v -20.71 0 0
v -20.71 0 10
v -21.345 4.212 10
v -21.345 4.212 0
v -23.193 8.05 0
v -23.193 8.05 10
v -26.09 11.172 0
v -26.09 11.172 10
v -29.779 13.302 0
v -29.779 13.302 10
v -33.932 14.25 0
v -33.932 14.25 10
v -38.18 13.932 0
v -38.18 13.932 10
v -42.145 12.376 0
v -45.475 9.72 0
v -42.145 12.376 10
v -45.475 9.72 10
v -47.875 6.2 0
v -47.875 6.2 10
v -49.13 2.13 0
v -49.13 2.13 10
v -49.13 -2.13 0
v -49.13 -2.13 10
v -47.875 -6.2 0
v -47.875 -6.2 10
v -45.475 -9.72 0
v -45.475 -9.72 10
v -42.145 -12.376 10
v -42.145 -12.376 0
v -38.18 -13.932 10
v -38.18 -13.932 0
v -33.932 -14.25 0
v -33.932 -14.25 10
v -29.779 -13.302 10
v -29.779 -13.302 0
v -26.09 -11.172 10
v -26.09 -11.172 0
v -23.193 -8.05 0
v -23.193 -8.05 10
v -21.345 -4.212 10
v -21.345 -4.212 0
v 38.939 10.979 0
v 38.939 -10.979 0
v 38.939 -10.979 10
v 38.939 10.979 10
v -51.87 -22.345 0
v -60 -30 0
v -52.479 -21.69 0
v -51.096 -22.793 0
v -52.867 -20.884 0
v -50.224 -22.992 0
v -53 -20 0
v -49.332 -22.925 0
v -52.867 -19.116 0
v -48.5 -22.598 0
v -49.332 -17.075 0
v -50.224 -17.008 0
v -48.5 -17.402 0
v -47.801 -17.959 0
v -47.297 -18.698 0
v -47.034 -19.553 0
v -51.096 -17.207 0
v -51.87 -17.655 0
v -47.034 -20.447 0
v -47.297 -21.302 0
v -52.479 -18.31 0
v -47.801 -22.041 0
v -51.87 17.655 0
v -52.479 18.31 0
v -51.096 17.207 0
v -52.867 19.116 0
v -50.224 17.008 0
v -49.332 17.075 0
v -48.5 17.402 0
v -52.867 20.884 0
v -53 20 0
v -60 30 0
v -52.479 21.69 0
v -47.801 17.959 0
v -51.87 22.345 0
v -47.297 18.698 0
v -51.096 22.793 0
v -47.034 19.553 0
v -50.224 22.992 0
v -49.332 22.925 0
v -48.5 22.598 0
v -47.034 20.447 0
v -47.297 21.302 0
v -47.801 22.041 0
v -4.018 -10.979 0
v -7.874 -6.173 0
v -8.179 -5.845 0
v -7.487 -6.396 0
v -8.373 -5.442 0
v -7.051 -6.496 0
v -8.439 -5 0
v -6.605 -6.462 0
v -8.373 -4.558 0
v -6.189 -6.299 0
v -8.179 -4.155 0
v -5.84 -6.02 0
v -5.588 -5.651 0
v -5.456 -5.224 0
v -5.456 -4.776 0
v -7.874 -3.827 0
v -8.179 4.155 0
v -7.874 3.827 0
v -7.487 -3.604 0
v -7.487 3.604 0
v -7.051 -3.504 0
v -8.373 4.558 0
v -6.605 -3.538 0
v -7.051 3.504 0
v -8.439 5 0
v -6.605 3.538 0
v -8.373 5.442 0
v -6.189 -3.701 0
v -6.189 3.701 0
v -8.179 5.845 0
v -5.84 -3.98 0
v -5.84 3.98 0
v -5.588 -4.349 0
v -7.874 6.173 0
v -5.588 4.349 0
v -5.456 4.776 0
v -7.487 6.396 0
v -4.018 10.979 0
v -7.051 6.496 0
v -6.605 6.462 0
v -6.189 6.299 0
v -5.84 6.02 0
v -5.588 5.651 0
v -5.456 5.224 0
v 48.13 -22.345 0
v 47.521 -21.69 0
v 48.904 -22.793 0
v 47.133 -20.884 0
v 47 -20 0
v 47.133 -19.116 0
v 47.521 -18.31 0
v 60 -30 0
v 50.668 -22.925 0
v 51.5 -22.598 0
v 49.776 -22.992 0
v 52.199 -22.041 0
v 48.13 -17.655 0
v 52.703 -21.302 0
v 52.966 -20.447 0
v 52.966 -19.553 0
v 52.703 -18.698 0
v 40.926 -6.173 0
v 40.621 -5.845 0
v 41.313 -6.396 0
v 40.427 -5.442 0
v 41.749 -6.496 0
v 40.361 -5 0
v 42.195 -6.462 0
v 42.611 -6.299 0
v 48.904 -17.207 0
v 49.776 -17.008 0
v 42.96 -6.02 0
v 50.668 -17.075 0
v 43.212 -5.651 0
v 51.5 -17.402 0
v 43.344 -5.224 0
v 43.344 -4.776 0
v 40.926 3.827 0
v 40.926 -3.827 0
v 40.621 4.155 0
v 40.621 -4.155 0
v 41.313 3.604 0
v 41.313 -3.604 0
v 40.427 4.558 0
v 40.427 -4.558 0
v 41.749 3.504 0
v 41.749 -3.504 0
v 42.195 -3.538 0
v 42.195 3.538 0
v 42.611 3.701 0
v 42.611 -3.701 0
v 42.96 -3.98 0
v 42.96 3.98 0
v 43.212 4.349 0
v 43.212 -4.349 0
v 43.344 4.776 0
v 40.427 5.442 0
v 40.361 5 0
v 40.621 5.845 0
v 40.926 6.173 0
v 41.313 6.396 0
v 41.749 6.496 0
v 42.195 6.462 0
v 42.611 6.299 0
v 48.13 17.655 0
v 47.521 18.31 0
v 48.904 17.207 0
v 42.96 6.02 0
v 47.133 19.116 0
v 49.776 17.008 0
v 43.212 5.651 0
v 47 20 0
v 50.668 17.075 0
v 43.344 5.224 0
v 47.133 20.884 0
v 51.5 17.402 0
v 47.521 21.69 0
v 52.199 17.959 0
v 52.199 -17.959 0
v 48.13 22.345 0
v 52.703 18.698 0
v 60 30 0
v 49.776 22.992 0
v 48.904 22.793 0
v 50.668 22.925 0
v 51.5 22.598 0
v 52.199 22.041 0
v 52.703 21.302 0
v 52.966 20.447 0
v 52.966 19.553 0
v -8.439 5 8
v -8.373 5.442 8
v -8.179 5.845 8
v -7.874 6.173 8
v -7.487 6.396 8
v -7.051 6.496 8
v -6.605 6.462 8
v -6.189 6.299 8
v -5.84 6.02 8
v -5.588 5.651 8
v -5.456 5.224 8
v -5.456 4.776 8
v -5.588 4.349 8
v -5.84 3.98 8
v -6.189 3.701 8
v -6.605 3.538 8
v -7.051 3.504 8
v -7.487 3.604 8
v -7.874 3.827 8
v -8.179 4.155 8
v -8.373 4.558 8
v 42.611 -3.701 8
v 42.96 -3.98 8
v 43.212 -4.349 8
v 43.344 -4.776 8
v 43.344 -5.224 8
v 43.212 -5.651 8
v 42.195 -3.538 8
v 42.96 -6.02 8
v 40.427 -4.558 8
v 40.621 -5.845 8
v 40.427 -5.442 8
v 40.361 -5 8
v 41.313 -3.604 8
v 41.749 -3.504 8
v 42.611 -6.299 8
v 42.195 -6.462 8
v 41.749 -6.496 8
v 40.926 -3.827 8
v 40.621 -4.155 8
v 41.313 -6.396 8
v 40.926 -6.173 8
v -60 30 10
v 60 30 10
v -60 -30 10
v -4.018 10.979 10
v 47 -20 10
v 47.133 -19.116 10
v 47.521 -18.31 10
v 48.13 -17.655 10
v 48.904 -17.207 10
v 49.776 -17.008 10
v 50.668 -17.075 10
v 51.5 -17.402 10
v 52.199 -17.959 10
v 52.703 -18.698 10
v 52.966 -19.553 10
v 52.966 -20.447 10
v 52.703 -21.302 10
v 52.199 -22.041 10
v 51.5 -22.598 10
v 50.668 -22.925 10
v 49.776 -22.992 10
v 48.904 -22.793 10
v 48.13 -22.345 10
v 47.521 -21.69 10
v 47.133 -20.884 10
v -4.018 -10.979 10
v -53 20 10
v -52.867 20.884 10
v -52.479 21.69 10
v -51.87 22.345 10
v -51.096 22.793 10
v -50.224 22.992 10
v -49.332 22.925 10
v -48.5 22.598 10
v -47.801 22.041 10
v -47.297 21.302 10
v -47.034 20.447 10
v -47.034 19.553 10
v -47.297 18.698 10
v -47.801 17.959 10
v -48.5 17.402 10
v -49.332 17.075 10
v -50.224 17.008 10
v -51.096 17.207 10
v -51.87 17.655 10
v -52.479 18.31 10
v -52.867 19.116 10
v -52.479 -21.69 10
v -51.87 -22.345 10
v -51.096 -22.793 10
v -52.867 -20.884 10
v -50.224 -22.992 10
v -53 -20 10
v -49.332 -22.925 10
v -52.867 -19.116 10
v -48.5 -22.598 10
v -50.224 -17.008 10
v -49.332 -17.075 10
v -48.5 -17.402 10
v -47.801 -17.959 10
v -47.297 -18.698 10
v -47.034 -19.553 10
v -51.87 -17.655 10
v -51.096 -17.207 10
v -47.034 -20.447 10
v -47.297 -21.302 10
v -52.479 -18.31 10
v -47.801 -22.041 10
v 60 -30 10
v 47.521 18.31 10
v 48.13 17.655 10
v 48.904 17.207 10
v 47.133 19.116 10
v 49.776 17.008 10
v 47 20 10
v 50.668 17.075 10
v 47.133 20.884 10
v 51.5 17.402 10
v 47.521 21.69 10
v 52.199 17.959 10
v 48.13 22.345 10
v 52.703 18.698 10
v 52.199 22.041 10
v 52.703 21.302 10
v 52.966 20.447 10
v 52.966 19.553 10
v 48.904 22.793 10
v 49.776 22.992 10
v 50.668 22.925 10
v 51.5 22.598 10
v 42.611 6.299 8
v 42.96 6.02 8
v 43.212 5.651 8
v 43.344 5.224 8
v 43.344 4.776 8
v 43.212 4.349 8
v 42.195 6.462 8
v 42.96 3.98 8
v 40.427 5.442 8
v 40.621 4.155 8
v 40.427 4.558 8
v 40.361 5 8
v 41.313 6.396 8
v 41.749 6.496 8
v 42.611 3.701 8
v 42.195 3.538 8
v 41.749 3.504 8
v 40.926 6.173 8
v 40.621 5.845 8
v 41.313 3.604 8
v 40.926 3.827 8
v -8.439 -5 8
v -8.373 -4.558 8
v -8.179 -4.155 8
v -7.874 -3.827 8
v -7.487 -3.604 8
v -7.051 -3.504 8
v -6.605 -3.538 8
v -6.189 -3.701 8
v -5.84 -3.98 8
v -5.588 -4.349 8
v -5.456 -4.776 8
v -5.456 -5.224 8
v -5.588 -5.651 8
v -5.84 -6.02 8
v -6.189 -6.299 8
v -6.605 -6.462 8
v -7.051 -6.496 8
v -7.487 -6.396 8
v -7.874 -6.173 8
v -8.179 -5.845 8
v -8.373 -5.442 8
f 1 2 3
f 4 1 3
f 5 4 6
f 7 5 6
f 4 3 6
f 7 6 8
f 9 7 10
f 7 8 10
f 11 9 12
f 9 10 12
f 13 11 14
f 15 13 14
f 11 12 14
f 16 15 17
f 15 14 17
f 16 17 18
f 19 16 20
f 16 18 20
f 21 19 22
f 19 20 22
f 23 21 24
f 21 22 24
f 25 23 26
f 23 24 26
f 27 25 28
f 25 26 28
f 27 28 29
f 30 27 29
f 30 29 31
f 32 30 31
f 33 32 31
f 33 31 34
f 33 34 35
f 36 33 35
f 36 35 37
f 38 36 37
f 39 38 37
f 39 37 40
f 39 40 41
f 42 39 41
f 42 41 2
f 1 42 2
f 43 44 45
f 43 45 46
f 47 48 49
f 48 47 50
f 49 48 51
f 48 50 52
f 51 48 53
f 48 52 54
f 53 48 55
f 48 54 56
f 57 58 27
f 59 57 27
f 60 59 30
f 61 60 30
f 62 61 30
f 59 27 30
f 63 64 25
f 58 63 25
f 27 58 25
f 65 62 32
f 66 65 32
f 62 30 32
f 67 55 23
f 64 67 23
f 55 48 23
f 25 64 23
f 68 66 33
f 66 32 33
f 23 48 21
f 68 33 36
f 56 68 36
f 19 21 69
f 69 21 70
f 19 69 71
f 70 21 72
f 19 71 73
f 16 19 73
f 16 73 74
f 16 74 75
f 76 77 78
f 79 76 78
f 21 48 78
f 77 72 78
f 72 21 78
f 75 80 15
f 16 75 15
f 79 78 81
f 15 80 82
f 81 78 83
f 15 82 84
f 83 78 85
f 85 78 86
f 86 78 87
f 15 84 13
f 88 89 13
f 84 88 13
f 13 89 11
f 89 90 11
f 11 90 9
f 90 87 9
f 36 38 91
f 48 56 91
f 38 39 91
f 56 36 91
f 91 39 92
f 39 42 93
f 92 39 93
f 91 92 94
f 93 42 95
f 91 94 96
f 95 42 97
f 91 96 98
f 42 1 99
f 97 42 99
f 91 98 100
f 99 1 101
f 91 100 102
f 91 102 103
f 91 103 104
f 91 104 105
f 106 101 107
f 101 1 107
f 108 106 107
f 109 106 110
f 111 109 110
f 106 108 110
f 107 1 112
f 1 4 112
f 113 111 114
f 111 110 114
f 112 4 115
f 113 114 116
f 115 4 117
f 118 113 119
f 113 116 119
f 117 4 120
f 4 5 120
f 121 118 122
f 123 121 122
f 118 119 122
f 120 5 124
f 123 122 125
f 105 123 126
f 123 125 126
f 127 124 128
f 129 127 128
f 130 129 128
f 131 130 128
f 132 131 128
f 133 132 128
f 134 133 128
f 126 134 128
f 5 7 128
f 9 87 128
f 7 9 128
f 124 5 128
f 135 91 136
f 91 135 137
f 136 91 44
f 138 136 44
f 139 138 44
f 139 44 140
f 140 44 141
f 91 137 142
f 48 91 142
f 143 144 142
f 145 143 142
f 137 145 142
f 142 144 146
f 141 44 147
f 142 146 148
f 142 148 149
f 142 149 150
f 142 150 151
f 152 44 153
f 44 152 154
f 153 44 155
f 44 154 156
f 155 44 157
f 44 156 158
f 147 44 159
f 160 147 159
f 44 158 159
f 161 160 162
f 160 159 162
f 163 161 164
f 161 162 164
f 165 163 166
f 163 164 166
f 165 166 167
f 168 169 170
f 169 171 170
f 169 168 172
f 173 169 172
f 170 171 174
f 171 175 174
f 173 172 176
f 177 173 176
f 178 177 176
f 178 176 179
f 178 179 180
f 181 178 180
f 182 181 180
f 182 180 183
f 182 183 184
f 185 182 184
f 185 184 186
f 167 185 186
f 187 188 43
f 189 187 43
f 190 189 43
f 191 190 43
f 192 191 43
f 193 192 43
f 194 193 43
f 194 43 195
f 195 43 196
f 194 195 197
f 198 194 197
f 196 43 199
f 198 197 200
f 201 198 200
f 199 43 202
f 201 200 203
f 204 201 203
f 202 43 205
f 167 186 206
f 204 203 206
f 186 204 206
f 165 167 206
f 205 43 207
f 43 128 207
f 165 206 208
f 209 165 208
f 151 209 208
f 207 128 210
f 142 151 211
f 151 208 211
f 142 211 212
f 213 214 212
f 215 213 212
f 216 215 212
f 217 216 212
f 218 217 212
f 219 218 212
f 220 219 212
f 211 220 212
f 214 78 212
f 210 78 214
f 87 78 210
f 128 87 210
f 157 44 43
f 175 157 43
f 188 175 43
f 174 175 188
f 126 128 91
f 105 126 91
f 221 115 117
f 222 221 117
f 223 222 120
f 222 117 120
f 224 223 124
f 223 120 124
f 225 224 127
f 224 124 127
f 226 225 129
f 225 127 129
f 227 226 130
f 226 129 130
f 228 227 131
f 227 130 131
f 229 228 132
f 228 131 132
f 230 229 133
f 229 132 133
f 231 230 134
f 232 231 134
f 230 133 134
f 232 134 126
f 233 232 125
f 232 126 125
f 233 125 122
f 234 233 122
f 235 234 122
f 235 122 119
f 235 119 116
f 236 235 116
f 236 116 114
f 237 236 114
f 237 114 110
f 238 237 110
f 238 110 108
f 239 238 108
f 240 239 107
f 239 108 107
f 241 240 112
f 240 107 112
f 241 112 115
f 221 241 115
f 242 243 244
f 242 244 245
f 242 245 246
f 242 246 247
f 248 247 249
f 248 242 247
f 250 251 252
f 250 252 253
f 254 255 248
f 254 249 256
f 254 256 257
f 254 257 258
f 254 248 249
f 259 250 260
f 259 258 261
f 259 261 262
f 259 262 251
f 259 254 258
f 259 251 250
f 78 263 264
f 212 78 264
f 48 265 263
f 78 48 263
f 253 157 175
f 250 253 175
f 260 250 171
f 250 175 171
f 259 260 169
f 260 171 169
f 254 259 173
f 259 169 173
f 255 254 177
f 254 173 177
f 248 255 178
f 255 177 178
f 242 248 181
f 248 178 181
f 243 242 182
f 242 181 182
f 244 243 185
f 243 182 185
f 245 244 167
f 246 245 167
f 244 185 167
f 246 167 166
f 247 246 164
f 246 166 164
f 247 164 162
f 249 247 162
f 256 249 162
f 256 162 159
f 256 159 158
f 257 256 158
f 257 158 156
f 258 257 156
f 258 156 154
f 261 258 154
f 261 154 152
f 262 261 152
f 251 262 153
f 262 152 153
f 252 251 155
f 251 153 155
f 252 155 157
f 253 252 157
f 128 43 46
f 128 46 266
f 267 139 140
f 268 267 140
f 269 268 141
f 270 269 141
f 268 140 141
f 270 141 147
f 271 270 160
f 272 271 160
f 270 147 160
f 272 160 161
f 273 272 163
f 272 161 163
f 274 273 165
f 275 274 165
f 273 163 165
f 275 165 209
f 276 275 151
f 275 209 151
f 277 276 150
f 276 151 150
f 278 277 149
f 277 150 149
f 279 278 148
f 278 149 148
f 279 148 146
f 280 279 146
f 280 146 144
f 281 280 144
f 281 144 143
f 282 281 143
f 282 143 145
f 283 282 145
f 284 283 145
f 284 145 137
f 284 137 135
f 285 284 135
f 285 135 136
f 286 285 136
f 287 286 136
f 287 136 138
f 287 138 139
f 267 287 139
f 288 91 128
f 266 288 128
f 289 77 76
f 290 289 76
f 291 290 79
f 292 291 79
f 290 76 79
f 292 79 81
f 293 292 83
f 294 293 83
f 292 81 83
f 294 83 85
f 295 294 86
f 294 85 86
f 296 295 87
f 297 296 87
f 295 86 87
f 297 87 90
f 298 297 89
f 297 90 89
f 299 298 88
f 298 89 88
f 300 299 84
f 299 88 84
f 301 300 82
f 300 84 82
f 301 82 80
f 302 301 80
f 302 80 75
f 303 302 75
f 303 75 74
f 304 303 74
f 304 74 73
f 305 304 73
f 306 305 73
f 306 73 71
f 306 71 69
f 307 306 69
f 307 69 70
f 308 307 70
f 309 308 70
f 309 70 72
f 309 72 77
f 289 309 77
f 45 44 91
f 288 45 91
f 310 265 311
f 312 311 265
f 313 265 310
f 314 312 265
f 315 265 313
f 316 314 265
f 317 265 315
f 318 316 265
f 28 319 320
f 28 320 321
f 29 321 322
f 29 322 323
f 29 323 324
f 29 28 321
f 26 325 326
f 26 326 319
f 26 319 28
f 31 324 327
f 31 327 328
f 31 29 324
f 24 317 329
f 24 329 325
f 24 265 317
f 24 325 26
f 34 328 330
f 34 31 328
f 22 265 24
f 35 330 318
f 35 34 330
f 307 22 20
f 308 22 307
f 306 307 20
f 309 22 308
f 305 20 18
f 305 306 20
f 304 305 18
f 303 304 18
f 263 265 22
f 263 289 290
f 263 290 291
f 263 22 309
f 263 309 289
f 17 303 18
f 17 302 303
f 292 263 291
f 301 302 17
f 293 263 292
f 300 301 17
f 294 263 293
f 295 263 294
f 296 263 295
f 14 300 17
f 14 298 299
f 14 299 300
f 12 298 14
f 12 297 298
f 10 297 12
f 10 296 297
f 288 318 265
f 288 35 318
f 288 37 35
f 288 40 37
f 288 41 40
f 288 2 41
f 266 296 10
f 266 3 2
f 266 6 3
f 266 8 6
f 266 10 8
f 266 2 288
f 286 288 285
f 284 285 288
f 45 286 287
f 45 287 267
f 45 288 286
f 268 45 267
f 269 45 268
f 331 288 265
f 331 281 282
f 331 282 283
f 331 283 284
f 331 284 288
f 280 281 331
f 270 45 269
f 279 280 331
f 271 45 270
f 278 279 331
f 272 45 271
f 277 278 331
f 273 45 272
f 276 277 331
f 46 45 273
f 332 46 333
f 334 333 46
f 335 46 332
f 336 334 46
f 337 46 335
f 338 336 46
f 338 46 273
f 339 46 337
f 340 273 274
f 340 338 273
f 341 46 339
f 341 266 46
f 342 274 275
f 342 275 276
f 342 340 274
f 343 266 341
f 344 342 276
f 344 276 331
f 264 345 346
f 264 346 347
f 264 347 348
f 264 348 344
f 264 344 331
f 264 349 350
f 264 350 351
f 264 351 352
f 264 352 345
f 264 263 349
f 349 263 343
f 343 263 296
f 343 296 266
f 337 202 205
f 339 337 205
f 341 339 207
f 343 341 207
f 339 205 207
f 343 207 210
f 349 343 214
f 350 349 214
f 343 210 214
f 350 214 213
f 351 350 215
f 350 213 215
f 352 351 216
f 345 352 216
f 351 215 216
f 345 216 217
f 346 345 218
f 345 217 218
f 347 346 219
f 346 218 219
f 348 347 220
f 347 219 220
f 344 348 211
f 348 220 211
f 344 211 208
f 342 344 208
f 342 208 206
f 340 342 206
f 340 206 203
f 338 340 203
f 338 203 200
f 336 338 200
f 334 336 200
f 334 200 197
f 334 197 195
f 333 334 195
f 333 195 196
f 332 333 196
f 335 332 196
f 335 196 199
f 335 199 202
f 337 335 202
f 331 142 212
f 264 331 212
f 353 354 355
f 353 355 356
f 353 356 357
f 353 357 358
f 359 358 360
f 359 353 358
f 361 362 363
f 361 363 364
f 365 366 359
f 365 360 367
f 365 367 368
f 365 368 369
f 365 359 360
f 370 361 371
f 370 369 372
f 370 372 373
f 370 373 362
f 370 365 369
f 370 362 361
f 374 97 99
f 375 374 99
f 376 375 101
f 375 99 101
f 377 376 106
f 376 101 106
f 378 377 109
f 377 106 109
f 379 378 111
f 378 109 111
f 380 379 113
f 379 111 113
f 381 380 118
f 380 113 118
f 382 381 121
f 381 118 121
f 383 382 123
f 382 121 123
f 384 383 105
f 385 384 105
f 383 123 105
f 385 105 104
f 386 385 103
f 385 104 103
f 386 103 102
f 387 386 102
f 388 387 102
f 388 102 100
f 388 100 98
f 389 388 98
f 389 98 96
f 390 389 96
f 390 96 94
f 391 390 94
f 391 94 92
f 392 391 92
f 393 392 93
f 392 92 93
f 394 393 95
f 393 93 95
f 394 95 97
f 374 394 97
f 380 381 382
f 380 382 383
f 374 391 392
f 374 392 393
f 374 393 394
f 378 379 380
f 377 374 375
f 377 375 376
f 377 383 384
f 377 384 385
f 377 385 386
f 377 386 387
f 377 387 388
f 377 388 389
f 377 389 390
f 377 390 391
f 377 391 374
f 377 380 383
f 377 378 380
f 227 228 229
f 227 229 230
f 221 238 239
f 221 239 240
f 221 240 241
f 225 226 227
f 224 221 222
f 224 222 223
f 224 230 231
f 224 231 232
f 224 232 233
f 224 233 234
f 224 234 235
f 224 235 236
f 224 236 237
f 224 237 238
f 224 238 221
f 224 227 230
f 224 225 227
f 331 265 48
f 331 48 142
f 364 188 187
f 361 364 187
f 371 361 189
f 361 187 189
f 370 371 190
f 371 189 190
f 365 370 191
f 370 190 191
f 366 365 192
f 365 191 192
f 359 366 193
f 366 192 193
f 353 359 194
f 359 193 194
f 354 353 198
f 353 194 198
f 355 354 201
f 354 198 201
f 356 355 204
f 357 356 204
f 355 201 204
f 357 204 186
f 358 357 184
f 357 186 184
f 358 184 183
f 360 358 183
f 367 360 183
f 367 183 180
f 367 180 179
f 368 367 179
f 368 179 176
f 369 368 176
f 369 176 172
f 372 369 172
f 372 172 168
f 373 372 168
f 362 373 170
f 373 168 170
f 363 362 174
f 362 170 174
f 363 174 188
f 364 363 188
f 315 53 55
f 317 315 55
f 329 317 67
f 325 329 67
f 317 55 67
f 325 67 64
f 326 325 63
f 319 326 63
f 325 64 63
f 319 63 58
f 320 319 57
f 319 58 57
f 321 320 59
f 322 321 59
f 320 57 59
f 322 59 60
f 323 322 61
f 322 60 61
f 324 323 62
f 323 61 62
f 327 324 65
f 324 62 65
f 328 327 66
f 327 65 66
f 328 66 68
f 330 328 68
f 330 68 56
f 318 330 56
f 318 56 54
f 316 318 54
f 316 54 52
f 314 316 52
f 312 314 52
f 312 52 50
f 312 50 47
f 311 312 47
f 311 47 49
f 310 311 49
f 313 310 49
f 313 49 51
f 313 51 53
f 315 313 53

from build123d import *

# Parameters (mm, degrees)
CROQUIS1_W              = 120
CROQUIS1_H              = 60
SALIENTE_EXTRUIR1_DEPTH = 10
CROQUIS2_R              = 14.29
CROQUIS2_R_2            = 4.5
CORTAR_EXTRUIR1_DEPTH   = 68.823299831
CROQUIS3_W              = 42.957247878
CROQUIS3_H              = 21.957247878
CORTAR_EXTRUIR2_DEPTH   = 68.823299831
CROQUIS4_R              = 1.5
CORTAR_EXTRUIR3_DEPTH   = 8
CROQUIS5_W              = 40
CROQUIS5_H              = 60
SALIENTE_EXTRUIR2_DEPTH = 10
CROQUIS6_R              = 14.29
CORTAR_EXTRUIR4_DEPTH   = 105.880884817
CROQUIS7_W              = 40
CROQUIS7_H              = 60
CORTAR_EXTRUIR5_DEPTH   = 105.880884817
CROQUIS8_R              = 3
CORTAR_EXTRUIR6_DEPTH   = 68.823299831


with BuildPart() as part:
    # Croquis1 → Saliente-Extruir1 (new body)
    with BuildSketch(Plane.XY):
        Rectangle(CROQUIS1_W, CROQUIS1_H)
    extrude(amount=SALIENTE_EXTRUIR1_DEPTH)

    # Croquis2 → Cortar-Extruir1 (cut, through all)
    with BuildSketch(Plane.XY.offset(10)):
        with Locations((-35, 0)):
            Circle(CROQUIS2_R)
        with Locations((6.9608, 0)):
            Circle(CROQUIS2_R_2)
    extrude(amount=-CORTAR_EXTRUIR1_DEPTH, mode=Mode.SUBTRACT)

    # Croquis3 → Cortar-Extruir2 (cut, through all)
    with BuildSketch(Plane(origin=(0, 0, 0), x_dir=(-1, 0, 0), z_dir=(0, 0, -1))):
        with Locations((-17.4608, 0)):
            Rectangle(CROQUIS3_W, CROQUIS3_H)
    extrude(amount=-CORTAR_EXTRUIR2_DEPTH, mode=Mode.SUBTRACT)

    # Croquis4 → Cortar-Extruir3 (cut)
    with BuildSketch(Plane(origin=(0, 0, 0), x_dir=(-1, 0, 0), z_dir=(0, 0, -1))):
        with Locations((-41.8608, 5)):
            Circle(CROQUIS4_R)
        with Locations((6.9392, 5)):
            Circle(CROQUIS4_R)
        with Locations((6.9392, -5)):
            Circle(CROQUIS4_R)
        with Locations((-41.8608, -5)):
            Circle(CROQUIS4_R)
    extrude(amount=-CORTAR_EXTRUIR3_DEPTH, mode=Mode.SUBTRACT)

    # Croquis5 → Saliente-Extruir2 (add, through all)
    with BuildSketch(Plane.XY.offset(10)):
        with Locations((-80, 0)):
            Rectangle(CROQUIS5_W, CROQUIS5_H)
    extrude(amount=-SALIENTE_EXTRUIR2_DEPTH)

    # Croquis6 → Cortar-Extruir4 (cut, through all)
    with BuildSketch(Plane.XY.offset(10)):
        with Locations((-78.2308, 0)):
            Circle(CROQUIS6_R)
    extrude(amount=-CORTAR_EXTRUIR4_DEPTH, mode=Mode.SUBTRACT)

    # Croquis7 → Cortar-Extruir5 (cut, through all)
    with BuildSketch(Plane.XY.offset(10)):
        with Locations((-80, 0)):
            Rectangle(CROQUIS7_W, CROQUIS7_H)
    extrude(amount=-CORTAR_EXTRUIR5_DEPTH, mode=Mode.SUBTRACT)

    # Croquis8 → Cortar-Extruir6 (cut, through all)
    with BuildSketch(Plane(origin=(0, 0, 0), x_dir=(-1, 0, 0), z_dir=(0, 0, -1))):
        with Locations((-50, 20)):
            Circle(CROQUIS8_R)
        with Locations((50, 20)):
            Circle(CROQUIS8_R)
        with Locations((50, -20)):
            Circle(CROQUIS8_R)
        with Locations((-50, -20)):
            Circle(CROQUIS8_R)
    extrude(amount=-CORTAR_EXTRUIR6_DEPTH, mode=Mode.SUBTRACT)


solid = part.part
